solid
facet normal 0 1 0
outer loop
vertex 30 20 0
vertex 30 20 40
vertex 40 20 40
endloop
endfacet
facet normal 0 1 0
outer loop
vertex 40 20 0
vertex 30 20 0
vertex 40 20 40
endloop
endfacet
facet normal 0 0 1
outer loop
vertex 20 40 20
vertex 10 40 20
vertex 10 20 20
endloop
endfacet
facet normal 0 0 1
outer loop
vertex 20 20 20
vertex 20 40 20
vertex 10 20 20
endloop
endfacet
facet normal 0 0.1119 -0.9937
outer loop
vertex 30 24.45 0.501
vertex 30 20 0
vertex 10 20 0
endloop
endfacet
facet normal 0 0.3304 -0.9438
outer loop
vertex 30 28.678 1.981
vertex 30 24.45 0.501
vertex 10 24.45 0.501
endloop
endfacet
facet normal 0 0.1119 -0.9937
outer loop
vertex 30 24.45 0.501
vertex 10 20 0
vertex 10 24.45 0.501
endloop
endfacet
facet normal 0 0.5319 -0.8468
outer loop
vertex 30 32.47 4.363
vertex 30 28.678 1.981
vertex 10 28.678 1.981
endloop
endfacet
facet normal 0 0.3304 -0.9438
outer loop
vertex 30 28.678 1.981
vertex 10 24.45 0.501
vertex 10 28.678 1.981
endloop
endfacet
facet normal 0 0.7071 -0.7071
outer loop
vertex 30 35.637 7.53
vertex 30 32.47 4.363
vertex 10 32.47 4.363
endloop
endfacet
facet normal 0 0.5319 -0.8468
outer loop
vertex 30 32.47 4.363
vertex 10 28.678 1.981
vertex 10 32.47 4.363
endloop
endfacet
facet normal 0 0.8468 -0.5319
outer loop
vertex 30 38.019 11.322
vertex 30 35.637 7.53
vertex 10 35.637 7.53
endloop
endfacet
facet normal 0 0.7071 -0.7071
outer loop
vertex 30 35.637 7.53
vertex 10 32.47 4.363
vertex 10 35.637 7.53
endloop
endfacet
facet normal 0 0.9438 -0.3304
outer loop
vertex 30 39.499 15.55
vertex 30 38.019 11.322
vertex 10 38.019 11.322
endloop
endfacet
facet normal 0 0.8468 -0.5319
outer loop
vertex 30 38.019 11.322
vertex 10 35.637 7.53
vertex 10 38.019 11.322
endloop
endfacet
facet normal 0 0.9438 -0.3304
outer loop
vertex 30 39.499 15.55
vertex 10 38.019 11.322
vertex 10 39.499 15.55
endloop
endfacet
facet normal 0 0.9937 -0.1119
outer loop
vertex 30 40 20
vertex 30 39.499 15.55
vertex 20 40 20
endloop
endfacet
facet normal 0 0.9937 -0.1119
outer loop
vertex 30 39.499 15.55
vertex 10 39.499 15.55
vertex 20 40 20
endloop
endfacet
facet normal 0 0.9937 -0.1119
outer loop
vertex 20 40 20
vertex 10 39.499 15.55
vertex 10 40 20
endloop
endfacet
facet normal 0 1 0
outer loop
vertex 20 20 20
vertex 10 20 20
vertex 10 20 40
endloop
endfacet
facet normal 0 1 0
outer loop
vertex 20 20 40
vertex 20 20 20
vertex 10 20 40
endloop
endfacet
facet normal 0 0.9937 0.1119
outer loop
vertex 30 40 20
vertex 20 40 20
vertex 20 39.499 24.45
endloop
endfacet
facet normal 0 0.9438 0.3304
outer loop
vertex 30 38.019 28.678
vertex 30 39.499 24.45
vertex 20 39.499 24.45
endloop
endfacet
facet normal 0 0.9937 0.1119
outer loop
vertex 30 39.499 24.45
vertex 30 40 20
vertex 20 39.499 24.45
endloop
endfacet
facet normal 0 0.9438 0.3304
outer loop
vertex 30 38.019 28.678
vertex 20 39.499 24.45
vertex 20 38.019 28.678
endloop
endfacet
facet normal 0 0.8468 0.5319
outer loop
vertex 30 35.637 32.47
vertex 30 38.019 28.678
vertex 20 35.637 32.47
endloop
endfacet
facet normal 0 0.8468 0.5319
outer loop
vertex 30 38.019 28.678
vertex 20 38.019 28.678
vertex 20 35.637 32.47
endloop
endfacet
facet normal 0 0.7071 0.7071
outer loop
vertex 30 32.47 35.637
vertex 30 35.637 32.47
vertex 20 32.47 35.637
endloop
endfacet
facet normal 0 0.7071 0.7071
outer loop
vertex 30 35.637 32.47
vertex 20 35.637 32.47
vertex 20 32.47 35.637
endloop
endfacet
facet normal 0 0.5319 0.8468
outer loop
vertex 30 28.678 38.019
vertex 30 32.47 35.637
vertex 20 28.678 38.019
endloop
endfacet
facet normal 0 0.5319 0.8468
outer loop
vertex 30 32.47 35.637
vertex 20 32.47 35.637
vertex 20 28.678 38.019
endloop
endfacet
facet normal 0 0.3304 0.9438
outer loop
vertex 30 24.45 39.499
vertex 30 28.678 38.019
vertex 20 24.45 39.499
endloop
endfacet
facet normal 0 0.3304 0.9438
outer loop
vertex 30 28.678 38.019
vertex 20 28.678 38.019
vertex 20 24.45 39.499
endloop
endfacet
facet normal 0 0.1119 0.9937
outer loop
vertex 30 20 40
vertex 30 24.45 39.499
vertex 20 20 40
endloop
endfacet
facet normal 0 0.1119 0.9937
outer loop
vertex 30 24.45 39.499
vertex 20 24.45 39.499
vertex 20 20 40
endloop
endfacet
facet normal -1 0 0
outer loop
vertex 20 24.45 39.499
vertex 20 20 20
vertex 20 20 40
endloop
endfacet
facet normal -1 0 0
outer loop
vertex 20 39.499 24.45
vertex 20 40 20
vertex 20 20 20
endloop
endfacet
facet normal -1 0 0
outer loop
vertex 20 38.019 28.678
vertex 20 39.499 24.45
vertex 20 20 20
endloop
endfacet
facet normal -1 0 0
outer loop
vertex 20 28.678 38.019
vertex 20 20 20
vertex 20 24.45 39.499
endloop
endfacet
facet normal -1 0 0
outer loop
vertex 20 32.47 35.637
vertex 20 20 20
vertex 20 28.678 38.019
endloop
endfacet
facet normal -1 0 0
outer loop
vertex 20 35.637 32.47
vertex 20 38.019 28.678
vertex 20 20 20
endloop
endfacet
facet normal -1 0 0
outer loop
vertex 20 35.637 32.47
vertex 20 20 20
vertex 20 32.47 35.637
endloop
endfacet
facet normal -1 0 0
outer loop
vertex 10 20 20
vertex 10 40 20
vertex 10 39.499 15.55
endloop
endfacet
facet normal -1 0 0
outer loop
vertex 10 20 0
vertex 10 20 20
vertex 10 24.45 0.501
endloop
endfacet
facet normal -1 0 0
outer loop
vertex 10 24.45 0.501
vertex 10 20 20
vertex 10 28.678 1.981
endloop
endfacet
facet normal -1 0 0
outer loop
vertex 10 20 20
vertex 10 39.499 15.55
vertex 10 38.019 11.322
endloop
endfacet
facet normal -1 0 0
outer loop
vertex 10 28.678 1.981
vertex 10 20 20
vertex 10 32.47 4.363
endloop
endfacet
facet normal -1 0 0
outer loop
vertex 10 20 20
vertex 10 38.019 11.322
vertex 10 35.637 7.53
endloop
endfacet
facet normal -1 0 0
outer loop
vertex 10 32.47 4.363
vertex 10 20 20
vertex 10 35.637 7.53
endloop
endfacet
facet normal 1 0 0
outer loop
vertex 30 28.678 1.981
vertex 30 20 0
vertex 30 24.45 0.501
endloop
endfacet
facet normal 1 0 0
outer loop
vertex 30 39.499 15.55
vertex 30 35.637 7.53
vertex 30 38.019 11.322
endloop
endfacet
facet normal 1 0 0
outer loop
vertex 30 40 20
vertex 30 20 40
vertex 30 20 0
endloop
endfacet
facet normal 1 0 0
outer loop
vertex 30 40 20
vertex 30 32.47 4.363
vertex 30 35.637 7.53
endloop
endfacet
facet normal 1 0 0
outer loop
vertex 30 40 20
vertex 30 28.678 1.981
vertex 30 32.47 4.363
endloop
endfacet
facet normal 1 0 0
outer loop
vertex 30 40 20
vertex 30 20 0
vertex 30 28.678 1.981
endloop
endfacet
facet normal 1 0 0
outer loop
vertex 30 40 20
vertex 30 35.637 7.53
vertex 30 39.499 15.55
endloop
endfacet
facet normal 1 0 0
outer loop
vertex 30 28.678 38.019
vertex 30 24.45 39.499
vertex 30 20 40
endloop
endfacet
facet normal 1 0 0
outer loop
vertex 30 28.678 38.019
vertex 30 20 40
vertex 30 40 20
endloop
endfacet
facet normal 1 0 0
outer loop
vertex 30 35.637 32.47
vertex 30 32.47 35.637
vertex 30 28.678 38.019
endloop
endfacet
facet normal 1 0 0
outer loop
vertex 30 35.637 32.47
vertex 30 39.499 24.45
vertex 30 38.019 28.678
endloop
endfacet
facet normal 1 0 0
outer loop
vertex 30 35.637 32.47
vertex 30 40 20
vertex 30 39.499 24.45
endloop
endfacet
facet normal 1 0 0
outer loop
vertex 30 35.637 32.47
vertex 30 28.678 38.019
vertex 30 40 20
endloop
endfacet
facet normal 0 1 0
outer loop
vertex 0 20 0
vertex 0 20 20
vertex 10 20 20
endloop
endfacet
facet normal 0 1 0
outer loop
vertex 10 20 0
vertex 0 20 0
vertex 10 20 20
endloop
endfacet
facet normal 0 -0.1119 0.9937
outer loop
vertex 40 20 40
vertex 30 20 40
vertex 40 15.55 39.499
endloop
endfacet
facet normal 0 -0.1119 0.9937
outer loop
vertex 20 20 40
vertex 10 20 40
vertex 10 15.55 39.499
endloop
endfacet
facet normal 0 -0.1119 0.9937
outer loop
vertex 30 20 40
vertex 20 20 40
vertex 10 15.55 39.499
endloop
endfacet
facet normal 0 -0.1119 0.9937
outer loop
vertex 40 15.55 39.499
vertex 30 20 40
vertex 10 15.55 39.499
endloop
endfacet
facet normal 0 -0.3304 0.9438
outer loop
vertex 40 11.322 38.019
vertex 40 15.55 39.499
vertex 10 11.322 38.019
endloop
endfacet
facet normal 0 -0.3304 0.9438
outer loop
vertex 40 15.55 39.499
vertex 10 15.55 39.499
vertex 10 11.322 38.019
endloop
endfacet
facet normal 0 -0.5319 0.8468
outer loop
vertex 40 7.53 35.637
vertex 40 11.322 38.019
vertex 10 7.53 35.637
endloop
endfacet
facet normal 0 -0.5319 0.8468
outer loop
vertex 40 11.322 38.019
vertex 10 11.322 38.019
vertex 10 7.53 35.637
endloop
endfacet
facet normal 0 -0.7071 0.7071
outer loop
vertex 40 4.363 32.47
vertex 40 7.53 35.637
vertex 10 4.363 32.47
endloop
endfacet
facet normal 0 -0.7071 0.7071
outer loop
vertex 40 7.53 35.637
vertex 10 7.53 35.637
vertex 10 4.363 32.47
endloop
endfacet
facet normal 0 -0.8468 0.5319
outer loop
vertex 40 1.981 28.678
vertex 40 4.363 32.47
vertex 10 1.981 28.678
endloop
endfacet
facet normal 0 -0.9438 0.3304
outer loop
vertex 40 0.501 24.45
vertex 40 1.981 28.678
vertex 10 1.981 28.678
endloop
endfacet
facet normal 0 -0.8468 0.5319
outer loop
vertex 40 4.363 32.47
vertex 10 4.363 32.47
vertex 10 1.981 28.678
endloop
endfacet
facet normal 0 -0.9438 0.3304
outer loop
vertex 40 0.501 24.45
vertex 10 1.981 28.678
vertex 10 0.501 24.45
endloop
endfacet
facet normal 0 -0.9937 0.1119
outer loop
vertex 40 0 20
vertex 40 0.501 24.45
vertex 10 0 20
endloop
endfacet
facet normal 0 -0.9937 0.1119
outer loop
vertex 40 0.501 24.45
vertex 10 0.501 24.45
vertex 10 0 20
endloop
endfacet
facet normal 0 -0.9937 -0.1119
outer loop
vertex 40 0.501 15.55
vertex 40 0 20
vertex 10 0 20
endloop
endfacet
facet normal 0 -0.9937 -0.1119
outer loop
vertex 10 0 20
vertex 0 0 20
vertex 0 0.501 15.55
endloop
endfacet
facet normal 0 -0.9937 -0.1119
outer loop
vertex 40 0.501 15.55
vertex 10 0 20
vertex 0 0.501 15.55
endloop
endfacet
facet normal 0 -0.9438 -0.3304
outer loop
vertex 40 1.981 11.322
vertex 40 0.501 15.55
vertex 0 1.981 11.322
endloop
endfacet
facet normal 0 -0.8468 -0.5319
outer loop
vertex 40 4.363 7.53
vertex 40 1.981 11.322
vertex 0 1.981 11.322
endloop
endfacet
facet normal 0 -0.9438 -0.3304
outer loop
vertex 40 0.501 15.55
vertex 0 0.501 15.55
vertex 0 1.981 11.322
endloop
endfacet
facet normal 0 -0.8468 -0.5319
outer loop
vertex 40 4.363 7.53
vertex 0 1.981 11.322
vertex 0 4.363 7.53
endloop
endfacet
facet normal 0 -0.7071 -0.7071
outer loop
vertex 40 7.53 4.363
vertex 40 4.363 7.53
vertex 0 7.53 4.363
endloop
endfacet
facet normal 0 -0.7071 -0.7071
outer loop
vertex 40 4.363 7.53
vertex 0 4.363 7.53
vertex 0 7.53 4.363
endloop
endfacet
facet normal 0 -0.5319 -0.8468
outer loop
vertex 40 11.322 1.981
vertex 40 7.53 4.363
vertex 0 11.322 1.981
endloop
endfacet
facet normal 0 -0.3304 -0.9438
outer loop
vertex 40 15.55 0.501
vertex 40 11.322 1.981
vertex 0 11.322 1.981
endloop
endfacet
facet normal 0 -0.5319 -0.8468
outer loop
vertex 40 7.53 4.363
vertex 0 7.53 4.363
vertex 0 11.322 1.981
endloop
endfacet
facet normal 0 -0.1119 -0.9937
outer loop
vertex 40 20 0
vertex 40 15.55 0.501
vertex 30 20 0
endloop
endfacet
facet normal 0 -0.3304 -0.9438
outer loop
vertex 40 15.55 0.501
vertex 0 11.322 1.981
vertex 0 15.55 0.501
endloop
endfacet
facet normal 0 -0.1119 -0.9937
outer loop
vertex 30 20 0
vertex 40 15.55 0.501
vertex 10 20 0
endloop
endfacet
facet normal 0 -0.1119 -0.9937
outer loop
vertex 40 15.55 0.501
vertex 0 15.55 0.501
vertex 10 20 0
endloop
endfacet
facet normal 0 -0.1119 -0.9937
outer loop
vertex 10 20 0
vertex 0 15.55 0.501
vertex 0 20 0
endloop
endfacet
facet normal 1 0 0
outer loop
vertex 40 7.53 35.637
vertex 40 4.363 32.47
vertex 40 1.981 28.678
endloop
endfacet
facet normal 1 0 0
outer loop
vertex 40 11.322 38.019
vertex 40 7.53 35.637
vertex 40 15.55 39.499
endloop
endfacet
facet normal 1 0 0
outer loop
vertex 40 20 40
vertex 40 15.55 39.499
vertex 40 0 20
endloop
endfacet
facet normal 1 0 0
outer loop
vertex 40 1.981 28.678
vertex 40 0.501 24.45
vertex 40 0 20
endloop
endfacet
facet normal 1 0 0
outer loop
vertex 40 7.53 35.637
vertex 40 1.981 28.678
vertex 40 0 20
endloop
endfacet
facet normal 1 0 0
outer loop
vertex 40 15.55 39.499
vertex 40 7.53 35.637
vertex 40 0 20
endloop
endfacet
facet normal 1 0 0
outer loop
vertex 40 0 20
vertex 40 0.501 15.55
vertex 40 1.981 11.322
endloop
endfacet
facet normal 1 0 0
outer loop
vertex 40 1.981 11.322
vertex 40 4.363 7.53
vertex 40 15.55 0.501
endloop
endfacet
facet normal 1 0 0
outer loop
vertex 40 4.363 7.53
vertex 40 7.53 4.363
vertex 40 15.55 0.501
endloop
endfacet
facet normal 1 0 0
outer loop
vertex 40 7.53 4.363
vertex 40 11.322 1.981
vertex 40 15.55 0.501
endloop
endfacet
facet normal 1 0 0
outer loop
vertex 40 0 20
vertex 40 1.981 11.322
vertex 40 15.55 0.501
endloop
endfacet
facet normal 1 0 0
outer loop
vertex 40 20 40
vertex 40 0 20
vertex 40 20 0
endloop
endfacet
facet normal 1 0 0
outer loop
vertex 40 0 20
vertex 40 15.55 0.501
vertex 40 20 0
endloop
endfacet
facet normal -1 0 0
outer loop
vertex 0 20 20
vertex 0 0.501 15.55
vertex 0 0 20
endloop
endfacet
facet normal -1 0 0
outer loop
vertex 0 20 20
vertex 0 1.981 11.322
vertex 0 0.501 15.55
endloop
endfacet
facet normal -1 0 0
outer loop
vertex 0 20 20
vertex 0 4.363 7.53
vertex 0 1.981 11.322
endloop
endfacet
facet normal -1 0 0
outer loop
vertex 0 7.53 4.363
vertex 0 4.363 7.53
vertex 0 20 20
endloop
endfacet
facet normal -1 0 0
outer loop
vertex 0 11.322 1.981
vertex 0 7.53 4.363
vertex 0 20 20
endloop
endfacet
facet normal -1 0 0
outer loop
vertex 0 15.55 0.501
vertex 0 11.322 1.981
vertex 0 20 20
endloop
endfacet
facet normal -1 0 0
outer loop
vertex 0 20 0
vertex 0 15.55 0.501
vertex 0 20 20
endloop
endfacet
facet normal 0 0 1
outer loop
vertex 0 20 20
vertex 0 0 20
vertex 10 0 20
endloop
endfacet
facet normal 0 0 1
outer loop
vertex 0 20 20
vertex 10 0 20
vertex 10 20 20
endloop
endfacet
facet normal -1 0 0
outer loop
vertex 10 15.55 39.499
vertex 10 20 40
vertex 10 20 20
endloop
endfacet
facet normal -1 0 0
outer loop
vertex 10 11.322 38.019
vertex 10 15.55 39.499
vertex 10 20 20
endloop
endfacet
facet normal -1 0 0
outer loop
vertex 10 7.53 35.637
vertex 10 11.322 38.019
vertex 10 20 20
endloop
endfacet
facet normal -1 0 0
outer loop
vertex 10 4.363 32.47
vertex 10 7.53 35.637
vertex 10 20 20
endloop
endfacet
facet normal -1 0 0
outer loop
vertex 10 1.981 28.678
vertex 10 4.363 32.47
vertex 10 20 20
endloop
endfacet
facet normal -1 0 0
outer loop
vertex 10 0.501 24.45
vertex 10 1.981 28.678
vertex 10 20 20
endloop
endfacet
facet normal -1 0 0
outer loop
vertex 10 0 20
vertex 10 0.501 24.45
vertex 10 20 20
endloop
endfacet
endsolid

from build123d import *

# Parameters (mm, degrees)
SKETCH1_W           = 40
SKETCH1_H           = 40
BOSS_EXTRUDE1_DEPTH = 40
SKETCH2_W           = 10
SKETCH2_H           = 20
CUT_EXTRUDE1_DEPTH  = 40
CUT_EXTRUDE2_DEPTH  = 40
CUT_EXTRUDE3_DEPTH  = 40
CUT_EXTRUDE4_DEPTH  = 10
CUT_EXTRUDE5_DEPTH  = 10


with BuildPart() as part:
    # Sketch1 → Boss-Extrude1 (new body)
    with BuildSketch(Plane.XY):
        with Locations((20, 20)):
            Rectangle(SKETCH1_W, SKETCH1_H)
    extrude(amount=BOSS_EXTRUDE1_DEPTH)

    # Sketch2 → Cut-Extrude1 (cut)
    with BuildSketch(Plane.XY.offset(40)):
        with Locations((5, 30)):
            Rectangle(SKETCH2_W, SKETCH2_H)
        with Locations((35, 30)):
            Rectangle(SKETCH2_W, SKETCH2_H)
    extrude(amount=-CUT_EXTRUDE1_DEPTH, mode=Mode.SUBTRACT)

    # Sketch3 → Cut-Extrude2 (cut)
    with BuildSketch(Plane.ZY):
        with BuildLine():
            ThreePointArc((20, 0), (5.857864376, 5.857864376), (0, 20))
            Line((0, 20), (0, 0))
            Line((0, 0), (20, 0))
        make_face()
        with BuildLine():
            ThreePointArc((40, 20), (34.142135624, 5.857864376), (20, 0))
            Line((20, 0), (40, 0))
            Line((40, 0), (40, 20))
        make_face()
    extrude(amount=-CUT_EXTRUDE2_DEPTH, mode=Mode.SUBTRACT)

    # Sketch4 → Cut-Extrude3 (cut)
    with BuildSketch(Plane.ZY.offset(-10)):
        with BuildLine():
            Line((0, 40), (0, 20))
            ThreePointArc((0, 20), (5.857864376, 34.142135624), (20, 40))
            Line((20, 40), (0, 40))
        make_face()
        with BuildLine():
            Line((40, 40), (20, 40))
            ThreePointArc((20, 40), (34.142135624, 34.142135624), (40, 20))
            Line((40, 20), (40, 40))
        make_face()
    extrude(amount=-CUT_EXTRUDE3_DEPTH, mode=Mode.SUBTRACT)

    # Sketch5 → Cut-Extrude4 (cut)
    with BuildSketch(Plane.ZY):
        with BuildLine():
            Line((20, 0), (20, 20))
            Line((20, 20), (40, 20))
            ThreePointArc((40, 20), (34.142135624, 5.857864376), (20, 0))
        make_face()
    extrude(amount=-CUT_EXTRUDE4_DEPTH, mode=Mode.SUBTRACT)

    # Sketch6 → Cut-Extrude5 (cut)
    with BuildSketch(Plane.ZY.offset(-10)):
        with BuildLine():
            Line((20, 40), (20, 20))
            Line((20, 20), (40, 20))
            ThreePointArc((40, 20), (34.142135624, 34.142135624), (20, 40))
        make_face()
    extrude(amount=-CUT_EXTRUDE5_DEPTH, mode=Mode.SUBTRACT)


solid = part.part
